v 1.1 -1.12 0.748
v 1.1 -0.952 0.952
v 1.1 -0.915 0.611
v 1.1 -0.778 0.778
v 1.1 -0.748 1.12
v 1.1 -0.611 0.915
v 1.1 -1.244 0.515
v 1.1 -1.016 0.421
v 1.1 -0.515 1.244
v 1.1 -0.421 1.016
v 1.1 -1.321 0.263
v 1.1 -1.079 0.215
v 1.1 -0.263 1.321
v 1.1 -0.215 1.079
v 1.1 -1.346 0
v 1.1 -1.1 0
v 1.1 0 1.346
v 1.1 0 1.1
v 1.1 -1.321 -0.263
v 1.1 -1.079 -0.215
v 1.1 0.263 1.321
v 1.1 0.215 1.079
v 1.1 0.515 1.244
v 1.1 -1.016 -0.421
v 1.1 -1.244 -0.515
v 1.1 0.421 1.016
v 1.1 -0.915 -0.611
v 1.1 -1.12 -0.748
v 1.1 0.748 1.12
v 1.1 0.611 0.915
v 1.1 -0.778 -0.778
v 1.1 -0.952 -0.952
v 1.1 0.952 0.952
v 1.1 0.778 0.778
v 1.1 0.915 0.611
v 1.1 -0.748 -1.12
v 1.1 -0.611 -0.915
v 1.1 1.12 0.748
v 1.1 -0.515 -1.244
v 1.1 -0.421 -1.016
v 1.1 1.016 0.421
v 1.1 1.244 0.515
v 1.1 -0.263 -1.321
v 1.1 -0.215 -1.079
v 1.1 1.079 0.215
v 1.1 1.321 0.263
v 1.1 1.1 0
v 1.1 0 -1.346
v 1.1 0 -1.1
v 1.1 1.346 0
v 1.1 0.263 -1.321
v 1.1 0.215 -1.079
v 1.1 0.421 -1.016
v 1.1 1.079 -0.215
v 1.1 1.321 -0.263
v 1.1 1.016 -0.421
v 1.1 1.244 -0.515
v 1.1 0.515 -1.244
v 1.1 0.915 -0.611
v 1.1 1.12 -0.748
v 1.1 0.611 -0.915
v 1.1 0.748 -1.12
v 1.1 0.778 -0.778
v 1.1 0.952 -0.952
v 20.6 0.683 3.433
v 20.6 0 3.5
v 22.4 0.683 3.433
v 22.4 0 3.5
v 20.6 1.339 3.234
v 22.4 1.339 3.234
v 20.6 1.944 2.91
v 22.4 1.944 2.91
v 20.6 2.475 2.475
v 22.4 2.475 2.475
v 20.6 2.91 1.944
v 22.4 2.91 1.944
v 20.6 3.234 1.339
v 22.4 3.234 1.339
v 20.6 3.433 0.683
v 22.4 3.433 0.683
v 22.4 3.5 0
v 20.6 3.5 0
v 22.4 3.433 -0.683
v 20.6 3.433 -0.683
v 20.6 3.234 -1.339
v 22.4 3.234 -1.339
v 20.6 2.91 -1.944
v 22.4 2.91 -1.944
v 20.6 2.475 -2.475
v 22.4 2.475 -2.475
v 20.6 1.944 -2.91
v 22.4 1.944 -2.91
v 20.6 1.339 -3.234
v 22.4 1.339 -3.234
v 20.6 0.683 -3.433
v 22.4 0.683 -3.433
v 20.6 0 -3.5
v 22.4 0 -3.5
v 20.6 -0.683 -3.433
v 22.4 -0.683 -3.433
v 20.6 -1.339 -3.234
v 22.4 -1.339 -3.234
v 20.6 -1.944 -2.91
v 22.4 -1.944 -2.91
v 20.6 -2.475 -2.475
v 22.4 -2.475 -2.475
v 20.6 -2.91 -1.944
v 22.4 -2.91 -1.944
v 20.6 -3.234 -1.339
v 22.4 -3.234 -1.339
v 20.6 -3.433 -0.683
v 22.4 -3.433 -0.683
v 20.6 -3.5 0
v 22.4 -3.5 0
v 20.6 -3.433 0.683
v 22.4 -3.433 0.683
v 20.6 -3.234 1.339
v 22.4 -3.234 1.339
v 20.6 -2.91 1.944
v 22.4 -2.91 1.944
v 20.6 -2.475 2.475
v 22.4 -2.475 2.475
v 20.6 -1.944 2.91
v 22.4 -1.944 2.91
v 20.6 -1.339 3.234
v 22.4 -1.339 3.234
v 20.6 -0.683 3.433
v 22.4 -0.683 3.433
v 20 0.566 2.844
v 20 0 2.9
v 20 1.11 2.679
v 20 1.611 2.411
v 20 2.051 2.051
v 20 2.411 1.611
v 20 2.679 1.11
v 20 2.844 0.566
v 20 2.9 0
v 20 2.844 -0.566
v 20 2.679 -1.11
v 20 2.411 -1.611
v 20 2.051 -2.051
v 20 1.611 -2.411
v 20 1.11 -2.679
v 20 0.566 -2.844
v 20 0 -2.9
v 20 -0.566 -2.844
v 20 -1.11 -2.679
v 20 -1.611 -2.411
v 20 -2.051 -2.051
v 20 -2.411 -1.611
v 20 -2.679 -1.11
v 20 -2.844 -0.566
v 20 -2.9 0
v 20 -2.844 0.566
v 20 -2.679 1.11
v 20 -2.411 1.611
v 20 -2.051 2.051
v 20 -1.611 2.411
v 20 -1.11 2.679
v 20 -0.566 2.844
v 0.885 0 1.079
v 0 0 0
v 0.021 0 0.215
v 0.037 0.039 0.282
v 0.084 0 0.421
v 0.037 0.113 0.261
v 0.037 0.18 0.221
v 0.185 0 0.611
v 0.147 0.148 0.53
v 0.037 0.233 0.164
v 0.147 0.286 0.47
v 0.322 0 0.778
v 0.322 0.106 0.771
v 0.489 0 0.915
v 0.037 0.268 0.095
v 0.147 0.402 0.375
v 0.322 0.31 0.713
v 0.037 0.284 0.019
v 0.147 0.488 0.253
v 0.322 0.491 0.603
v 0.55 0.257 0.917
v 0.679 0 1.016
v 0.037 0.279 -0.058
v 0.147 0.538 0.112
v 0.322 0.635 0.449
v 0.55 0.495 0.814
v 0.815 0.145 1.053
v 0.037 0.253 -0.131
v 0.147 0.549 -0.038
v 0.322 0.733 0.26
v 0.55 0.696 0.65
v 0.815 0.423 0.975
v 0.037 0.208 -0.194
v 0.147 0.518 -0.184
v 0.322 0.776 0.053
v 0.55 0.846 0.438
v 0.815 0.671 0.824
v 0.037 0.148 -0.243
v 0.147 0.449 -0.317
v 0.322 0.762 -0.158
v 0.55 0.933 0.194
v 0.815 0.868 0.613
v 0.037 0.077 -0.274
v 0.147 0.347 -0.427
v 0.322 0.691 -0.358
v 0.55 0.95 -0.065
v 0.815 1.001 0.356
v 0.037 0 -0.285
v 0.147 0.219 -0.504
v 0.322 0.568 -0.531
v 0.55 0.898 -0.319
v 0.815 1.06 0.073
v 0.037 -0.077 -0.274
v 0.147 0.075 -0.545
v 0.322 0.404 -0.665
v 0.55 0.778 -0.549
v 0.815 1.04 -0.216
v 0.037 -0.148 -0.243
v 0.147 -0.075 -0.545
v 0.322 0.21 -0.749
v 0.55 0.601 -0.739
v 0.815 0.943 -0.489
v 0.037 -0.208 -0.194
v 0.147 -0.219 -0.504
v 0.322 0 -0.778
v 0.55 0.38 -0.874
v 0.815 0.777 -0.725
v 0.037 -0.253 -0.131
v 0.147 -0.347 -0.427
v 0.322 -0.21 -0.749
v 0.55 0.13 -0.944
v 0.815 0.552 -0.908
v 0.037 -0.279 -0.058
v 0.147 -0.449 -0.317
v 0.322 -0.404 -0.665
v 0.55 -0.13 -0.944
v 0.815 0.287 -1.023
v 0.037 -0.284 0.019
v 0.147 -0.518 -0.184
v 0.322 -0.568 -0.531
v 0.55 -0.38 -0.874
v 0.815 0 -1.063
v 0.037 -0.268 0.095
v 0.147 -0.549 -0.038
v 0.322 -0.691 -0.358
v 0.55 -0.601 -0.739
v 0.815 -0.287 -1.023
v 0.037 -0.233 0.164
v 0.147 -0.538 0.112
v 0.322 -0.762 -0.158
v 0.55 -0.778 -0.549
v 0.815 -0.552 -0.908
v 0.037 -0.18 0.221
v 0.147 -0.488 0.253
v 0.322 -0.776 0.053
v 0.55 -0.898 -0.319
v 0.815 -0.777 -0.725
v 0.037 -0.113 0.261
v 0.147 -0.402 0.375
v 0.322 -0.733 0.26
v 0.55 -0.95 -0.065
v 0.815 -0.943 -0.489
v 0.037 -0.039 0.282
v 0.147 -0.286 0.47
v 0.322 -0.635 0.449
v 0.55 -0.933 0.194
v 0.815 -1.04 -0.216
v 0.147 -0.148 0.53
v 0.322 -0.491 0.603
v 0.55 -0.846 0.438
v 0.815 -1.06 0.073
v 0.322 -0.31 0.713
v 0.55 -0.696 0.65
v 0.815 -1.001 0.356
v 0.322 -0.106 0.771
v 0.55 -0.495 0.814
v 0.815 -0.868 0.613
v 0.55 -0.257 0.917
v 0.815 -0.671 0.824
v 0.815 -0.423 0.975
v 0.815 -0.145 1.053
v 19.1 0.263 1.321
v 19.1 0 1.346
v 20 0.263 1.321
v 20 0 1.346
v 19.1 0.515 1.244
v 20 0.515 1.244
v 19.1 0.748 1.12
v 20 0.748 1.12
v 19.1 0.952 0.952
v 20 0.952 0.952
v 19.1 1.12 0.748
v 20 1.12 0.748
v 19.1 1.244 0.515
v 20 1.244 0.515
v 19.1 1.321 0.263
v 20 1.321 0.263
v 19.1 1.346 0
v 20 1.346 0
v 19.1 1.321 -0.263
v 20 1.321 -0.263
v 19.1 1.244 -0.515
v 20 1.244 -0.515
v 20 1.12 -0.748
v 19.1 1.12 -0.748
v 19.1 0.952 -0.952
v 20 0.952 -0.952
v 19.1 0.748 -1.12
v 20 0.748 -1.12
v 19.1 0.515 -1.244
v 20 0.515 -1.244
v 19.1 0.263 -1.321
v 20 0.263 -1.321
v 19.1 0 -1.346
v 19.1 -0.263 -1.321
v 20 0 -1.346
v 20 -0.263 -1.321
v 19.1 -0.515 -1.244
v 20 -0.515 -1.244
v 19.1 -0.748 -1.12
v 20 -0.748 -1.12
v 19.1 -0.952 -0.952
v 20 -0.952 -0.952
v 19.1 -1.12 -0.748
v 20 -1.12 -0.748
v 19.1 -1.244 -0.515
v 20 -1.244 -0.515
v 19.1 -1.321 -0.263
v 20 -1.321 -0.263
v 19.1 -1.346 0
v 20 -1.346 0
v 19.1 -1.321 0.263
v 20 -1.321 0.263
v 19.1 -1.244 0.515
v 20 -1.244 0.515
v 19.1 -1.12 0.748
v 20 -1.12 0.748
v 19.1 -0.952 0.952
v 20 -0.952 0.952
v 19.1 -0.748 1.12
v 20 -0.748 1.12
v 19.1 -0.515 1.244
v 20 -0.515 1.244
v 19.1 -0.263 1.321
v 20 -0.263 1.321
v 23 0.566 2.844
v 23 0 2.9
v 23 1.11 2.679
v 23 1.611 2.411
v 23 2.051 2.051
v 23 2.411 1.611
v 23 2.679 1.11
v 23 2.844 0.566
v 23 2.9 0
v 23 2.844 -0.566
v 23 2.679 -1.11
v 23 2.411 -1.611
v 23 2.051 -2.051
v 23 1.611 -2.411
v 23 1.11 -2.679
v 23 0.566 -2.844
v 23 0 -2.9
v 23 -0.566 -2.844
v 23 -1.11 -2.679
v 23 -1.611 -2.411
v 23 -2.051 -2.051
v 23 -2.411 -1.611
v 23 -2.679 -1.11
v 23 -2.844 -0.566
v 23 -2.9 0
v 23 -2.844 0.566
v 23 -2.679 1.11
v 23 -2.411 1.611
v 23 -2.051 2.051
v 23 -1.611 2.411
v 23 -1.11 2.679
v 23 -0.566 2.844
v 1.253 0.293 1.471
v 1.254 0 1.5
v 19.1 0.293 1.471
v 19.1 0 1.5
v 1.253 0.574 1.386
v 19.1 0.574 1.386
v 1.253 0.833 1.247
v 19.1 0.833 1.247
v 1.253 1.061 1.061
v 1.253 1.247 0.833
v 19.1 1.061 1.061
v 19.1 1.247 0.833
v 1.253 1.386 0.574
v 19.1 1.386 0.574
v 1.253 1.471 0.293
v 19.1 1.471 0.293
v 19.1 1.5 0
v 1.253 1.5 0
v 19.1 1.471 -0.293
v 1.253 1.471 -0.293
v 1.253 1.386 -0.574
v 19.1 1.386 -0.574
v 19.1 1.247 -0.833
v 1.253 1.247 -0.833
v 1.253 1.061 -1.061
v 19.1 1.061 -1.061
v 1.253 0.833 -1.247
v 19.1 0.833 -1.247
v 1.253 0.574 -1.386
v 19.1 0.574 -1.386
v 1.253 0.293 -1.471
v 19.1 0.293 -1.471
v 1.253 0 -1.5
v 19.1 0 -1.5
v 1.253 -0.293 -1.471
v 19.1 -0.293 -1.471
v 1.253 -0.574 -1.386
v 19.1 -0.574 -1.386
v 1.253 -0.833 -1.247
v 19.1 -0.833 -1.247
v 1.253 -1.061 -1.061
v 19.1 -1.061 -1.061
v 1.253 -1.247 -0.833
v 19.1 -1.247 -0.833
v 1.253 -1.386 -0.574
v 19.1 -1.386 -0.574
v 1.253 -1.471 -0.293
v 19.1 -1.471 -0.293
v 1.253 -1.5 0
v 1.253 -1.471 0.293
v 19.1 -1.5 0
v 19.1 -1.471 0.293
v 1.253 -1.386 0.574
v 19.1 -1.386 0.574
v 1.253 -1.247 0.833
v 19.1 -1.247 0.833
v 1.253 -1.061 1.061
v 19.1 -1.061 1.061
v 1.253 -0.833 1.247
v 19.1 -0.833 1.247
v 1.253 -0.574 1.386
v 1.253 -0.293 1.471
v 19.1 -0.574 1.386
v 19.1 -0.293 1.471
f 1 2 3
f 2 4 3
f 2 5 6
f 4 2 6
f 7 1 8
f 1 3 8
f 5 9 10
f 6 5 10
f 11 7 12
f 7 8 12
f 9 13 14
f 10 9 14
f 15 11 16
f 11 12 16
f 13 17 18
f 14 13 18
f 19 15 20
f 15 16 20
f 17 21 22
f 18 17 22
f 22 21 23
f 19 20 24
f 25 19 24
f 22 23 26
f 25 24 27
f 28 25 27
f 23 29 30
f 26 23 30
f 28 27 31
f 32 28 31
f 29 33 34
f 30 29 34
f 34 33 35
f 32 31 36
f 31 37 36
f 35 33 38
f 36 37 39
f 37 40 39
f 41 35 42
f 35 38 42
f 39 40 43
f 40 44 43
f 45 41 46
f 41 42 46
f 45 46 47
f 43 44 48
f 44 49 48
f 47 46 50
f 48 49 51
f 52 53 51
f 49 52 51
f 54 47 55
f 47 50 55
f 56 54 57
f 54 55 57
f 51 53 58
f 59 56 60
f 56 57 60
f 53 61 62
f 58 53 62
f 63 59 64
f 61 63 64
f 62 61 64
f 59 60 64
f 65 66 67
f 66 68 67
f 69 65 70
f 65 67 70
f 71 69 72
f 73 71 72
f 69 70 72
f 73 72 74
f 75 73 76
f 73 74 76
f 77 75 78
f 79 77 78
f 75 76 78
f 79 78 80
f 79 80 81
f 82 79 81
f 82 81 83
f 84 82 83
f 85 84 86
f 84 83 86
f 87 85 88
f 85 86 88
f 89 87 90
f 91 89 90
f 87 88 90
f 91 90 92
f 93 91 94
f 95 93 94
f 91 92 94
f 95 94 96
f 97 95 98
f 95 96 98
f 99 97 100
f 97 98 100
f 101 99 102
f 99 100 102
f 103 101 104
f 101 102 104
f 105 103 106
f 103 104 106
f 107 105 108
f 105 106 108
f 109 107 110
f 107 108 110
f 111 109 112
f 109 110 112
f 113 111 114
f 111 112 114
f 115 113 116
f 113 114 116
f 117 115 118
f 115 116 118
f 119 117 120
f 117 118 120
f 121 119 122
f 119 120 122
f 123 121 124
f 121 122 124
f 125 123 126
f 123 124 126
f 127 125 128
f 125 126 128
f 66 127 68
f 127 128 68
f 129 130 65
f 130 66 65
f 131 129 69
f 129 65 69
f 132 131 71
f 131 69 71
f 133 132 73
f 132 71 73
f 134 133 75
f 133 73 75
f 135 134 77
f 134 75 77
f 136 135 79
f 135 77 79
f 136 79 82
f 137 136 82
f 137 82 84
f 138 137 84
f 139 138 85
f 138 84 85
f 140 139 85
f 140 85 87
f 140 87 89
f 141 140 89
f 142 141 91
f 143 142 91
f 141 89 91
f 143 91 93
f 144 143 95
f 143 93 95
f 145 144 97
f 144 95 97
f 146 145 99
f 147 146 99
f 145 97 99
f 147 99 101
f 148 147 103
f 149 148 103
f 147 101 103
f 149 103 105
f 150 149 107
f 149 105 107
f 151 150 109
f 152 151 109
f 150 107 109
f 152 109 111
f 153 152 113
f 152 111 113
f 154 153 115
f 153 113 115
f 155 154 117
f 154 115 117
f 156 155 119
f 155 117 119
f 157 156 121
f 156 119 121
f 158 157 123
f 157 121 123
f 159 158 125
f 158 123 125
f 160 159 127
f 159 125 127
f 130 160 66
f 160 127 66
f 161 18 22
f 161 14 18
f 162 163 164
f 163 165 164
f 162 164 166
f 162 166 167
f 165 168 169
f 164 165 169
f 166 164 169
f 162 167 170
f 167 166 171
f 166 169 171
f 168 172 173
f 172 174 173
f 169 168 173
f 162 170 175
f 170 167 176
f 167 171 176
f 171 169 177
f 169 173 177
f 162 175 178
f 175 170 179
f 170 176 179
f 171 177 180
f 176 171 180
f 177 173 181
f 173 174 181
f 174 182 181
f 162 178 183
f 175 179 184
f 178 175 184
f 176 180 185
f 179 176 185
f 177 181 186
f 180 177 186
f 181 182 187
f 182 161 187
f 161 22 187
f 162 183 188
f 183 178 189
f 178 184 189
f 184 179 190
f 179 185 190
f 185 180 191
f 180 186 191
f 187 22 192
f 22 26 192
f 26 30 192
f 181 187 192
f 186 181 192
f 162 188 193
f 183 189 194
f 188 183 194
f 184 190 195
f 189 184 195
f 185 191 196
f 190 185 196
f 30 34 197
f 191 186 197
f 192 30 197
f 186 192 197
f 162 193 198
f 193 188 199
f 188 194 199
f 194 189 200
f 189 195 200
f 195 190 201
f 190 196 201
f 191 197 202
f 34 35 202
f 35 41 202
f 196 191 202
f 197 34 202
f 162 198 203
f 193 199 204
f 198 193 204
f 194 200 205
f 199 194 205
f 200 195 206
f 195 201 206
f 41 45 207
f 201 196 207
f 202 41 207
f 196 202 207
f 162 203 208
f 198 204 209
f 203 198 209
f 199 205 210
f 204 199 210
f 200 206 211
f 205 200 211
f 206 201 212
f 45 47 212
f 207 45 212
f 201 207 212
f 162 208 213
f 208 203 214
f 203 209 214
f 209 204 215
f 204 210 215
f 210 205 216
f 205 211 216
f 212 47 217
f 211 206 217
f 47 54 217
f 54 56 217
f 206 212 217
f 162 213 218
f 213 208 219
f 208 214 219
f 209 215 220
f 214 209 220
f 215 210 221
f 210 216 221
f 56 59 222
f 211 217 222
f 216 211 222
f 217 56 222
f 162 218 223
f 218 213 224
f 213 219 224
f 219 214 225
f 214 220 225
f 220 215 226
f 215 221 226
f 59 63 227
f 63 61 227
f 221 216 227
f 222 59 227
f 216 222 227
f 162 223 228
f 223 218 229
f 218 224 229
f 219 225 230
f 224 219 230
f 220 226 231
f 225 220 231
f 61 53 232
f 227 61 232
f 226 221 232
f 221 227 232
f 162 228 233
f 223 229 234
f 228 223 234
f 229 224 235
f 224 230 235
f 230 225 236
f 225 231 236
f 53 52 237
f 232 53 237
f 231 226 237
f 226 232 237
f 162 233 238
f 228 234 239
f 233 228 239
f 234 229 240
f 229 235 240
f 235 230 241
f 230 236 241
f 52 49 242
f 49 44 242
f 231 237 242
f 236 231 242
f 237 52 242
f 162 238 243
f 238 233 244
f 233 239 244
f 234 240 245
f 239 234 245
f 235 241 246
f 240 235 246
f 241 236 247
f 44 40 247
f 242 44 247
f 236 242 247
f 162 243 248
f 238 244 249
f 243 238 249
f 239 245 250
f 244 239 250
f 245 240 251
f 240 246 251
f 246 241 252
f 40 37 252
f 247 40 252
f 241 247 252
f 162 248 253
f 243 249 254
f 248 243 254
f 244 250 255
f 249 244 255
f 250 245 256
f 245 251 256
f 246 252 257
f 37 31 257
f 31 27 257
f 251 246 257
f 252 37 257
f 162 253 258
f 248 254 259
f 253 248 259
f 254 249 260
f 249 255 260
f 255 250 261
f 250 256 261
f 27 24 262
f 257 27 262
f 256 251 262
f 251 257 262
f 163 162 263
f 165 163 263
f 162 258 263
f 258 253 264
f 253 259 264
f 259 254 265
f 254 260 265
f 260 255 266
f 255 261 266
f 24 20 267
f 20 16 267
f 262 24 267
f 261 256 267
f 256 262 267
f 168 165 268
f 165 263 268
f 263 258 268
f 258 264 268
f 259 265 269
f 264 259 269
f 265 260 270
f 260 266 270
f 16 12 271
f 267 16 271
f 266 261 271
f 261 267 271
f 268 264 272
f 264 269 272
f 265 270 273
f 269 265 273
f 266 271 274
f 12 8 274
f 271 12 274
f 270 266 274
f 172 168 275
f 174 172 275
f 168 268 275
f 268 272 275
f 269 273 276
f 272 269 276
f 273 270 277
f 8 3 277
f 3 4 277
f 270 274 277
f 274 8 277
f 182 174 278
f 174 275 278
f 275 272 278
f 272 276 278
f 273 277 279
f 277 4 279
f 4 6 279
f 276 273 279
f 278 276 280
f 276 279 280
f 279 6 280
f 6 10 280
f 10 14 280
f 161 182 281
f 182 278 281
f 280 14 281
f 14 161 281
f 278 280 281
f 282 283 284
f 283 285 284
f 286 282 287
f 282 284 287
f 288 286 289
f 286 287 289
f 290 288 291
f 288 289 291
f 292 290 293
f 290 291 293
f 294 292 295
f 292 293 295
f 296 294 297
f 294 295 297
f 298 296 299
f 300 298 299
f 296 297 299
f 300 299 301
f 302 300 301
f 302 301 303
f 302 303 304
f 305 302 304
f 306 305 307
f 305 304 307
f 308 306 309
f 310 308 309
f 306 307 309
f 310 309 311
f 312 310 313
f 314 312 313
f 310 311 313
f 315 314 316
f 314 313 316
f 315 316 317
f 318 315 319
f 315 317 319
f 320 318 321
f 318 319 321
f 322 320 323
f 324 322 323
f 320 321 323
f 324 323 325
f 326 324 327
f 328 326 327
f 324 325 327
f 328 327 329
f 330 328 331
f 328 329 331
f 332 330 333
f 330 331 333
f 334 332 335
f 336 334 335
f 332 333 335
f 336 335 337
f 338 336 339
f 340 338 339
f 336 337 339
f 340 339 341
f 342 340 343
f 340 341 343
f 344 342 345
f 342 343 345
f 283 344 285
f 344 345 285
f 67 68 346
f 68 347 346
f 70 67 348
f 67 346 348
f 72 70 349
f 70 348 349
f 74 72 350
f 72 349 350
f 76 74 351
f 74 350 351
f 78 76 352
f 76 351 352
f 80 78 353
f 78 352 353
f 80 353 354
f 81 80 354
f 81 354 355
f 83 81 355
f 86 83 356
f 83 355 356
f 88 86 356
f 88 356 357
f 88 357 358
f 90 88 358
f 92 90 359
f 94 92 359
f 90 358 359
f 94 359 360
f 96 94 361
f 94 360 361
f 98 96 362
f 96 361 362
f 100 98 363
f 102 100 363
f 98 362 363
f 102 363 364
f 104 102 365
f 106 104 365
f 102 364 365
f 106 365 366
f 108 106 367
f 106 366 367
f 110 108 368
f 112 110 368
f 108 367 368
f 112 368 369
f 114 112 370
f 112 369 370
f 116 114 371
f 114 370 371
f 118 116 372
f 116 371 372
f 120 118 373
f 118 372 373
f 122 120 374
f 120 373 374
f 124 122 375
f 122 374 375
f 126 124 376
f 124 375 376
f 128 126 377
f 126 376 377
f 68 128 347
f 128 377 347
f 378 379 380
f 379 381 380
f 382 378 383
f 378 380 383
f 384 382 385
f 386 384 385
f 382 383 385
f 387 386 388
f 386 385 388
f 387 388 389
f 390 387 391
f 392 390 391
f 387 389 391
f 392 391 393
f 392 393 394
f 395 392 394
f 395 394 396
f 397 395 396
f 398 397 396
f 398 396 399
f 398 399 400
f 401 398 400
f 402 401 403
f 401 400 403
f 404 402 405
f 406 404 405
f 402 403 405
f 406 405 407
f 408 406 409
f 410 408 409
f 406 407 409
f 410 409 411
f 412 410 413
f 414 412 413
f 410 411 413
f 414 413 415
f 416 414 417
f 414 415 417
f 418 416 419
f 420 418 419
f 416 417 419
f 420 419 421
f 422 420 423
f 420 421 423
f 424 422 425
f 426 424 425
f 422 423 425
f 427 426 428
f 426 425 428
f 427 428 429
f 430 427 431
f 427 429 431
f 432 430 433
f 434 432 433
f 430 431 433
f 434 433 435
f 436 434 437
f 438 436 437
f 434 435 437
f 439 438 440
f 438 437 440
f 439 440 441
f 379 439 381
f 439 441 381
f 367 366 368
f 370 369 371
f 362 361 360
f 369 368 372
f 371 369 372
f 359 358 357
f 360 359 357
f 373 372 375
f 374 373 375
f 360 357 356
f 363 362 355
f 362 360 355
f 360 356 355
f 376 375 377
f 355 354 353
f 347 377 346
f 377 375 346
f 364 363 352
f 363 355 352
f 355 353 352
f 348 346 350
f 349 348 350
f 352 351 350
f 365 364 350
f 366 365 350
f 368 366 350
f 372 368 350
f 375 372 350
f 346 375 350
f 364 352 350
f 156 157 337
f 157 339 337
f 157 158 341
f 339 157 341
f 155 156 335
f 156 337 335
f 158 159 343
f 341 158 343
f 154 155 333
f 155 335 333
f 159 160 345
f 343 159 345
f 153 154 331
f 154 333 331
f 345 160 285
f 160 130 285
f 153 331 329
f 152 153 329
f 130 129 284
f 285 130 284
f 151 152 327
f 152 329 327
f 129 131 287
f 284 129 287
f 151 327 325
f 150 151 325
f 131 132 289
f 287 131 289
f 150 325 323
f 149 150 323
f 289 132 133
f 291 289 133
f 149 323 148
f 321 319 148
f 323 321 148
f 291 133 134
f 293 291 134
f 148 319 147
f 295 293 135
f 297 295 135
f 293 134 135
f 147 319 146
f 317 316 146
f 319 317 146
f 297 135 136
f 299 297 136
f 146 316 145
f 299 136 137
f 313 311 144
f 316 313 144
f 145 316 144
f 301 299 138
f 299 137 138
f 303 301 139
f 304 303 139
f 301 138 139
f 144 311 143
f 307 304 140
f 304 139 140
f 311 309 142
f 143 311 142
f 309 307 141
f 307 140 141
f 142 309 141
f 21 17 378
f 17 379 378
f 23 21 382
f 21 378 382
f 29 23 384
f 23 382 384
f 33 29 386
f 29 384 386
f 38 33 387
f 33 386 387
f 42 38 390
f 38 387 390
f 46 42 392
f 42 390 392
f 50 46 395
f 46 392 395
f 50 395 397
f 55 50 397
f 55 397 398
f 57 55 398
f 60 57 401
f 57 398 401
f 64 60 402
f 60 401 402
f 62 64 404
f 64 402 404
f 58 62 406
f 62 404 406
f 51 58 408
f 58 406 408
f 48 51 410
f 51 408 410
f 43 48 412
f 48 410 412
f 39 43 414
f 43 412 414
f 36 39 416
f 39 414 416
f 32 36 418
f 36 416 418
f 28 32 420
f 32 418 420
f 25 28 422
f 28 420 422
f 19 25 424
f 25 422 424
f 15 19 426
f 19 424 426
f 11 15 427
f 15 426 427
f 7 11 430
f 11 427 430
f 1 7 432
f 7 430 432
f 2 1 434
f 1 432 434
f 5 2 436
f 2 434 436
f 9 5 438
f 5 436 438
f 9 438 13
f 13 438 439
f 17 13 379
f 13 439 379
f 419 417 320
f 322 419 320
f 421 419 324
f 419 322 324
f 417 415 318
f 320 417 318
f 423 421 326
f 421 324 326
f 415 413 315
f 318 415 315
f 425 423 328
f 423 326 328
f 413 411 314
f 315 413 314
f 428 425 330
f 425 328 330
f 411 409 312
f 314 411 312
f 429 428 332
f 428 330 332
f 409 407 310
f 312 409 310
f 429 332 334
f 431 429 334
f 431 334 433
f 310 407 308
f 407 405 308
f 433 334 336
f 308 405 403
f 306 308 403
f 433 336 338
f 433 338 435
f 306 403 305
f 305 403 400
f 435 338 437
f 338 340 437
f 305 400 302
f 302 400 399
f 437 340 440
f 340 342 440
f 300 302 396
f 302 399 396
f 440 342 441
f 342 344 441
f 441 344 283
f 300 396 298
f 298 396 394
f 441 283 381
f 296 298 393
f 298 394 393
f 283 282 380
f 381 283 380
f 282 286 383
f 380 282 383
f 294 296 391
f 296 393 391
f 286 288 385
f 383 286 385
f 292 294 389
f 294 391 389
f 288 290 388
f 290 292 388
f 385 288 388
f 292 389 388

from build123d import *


with BuildPart() as part:
    # 草图1 → 旋转1 (revolve)
    with BuildSketch(Plane.XY):
        with BuildLine():
            Line((1.1, 1.1), (1.1, 1.3465))
            Line((1.1, 1.3465), (1.2535, 1.5))
            Line((1.2535, 1.5), (19.1, 1.5))
            Line((19.1, 1.5), (19.1, 1.3465))
            Line((19.1, 1.3465), (20, 1.3465))
            Line((20, 1.3465), (20, 2.9))
            Line((20, 2.9), (20.6, 3.5))
            Line((20.6, 3.5), (22.4, 3.5))
            Line((22.4, 3.5), (23, 2.9))
            Line((23, 2.9), (23, 0))
            Line((23, 0), (0, 0))
            ThreePointArc((0, 0), (0.322182541, 0.777817459), (1.1, 1.1))
        make_face()
    revolve(axis=Axis((23, 0, 0), (-1, 0, 0)))


solid = part.part
